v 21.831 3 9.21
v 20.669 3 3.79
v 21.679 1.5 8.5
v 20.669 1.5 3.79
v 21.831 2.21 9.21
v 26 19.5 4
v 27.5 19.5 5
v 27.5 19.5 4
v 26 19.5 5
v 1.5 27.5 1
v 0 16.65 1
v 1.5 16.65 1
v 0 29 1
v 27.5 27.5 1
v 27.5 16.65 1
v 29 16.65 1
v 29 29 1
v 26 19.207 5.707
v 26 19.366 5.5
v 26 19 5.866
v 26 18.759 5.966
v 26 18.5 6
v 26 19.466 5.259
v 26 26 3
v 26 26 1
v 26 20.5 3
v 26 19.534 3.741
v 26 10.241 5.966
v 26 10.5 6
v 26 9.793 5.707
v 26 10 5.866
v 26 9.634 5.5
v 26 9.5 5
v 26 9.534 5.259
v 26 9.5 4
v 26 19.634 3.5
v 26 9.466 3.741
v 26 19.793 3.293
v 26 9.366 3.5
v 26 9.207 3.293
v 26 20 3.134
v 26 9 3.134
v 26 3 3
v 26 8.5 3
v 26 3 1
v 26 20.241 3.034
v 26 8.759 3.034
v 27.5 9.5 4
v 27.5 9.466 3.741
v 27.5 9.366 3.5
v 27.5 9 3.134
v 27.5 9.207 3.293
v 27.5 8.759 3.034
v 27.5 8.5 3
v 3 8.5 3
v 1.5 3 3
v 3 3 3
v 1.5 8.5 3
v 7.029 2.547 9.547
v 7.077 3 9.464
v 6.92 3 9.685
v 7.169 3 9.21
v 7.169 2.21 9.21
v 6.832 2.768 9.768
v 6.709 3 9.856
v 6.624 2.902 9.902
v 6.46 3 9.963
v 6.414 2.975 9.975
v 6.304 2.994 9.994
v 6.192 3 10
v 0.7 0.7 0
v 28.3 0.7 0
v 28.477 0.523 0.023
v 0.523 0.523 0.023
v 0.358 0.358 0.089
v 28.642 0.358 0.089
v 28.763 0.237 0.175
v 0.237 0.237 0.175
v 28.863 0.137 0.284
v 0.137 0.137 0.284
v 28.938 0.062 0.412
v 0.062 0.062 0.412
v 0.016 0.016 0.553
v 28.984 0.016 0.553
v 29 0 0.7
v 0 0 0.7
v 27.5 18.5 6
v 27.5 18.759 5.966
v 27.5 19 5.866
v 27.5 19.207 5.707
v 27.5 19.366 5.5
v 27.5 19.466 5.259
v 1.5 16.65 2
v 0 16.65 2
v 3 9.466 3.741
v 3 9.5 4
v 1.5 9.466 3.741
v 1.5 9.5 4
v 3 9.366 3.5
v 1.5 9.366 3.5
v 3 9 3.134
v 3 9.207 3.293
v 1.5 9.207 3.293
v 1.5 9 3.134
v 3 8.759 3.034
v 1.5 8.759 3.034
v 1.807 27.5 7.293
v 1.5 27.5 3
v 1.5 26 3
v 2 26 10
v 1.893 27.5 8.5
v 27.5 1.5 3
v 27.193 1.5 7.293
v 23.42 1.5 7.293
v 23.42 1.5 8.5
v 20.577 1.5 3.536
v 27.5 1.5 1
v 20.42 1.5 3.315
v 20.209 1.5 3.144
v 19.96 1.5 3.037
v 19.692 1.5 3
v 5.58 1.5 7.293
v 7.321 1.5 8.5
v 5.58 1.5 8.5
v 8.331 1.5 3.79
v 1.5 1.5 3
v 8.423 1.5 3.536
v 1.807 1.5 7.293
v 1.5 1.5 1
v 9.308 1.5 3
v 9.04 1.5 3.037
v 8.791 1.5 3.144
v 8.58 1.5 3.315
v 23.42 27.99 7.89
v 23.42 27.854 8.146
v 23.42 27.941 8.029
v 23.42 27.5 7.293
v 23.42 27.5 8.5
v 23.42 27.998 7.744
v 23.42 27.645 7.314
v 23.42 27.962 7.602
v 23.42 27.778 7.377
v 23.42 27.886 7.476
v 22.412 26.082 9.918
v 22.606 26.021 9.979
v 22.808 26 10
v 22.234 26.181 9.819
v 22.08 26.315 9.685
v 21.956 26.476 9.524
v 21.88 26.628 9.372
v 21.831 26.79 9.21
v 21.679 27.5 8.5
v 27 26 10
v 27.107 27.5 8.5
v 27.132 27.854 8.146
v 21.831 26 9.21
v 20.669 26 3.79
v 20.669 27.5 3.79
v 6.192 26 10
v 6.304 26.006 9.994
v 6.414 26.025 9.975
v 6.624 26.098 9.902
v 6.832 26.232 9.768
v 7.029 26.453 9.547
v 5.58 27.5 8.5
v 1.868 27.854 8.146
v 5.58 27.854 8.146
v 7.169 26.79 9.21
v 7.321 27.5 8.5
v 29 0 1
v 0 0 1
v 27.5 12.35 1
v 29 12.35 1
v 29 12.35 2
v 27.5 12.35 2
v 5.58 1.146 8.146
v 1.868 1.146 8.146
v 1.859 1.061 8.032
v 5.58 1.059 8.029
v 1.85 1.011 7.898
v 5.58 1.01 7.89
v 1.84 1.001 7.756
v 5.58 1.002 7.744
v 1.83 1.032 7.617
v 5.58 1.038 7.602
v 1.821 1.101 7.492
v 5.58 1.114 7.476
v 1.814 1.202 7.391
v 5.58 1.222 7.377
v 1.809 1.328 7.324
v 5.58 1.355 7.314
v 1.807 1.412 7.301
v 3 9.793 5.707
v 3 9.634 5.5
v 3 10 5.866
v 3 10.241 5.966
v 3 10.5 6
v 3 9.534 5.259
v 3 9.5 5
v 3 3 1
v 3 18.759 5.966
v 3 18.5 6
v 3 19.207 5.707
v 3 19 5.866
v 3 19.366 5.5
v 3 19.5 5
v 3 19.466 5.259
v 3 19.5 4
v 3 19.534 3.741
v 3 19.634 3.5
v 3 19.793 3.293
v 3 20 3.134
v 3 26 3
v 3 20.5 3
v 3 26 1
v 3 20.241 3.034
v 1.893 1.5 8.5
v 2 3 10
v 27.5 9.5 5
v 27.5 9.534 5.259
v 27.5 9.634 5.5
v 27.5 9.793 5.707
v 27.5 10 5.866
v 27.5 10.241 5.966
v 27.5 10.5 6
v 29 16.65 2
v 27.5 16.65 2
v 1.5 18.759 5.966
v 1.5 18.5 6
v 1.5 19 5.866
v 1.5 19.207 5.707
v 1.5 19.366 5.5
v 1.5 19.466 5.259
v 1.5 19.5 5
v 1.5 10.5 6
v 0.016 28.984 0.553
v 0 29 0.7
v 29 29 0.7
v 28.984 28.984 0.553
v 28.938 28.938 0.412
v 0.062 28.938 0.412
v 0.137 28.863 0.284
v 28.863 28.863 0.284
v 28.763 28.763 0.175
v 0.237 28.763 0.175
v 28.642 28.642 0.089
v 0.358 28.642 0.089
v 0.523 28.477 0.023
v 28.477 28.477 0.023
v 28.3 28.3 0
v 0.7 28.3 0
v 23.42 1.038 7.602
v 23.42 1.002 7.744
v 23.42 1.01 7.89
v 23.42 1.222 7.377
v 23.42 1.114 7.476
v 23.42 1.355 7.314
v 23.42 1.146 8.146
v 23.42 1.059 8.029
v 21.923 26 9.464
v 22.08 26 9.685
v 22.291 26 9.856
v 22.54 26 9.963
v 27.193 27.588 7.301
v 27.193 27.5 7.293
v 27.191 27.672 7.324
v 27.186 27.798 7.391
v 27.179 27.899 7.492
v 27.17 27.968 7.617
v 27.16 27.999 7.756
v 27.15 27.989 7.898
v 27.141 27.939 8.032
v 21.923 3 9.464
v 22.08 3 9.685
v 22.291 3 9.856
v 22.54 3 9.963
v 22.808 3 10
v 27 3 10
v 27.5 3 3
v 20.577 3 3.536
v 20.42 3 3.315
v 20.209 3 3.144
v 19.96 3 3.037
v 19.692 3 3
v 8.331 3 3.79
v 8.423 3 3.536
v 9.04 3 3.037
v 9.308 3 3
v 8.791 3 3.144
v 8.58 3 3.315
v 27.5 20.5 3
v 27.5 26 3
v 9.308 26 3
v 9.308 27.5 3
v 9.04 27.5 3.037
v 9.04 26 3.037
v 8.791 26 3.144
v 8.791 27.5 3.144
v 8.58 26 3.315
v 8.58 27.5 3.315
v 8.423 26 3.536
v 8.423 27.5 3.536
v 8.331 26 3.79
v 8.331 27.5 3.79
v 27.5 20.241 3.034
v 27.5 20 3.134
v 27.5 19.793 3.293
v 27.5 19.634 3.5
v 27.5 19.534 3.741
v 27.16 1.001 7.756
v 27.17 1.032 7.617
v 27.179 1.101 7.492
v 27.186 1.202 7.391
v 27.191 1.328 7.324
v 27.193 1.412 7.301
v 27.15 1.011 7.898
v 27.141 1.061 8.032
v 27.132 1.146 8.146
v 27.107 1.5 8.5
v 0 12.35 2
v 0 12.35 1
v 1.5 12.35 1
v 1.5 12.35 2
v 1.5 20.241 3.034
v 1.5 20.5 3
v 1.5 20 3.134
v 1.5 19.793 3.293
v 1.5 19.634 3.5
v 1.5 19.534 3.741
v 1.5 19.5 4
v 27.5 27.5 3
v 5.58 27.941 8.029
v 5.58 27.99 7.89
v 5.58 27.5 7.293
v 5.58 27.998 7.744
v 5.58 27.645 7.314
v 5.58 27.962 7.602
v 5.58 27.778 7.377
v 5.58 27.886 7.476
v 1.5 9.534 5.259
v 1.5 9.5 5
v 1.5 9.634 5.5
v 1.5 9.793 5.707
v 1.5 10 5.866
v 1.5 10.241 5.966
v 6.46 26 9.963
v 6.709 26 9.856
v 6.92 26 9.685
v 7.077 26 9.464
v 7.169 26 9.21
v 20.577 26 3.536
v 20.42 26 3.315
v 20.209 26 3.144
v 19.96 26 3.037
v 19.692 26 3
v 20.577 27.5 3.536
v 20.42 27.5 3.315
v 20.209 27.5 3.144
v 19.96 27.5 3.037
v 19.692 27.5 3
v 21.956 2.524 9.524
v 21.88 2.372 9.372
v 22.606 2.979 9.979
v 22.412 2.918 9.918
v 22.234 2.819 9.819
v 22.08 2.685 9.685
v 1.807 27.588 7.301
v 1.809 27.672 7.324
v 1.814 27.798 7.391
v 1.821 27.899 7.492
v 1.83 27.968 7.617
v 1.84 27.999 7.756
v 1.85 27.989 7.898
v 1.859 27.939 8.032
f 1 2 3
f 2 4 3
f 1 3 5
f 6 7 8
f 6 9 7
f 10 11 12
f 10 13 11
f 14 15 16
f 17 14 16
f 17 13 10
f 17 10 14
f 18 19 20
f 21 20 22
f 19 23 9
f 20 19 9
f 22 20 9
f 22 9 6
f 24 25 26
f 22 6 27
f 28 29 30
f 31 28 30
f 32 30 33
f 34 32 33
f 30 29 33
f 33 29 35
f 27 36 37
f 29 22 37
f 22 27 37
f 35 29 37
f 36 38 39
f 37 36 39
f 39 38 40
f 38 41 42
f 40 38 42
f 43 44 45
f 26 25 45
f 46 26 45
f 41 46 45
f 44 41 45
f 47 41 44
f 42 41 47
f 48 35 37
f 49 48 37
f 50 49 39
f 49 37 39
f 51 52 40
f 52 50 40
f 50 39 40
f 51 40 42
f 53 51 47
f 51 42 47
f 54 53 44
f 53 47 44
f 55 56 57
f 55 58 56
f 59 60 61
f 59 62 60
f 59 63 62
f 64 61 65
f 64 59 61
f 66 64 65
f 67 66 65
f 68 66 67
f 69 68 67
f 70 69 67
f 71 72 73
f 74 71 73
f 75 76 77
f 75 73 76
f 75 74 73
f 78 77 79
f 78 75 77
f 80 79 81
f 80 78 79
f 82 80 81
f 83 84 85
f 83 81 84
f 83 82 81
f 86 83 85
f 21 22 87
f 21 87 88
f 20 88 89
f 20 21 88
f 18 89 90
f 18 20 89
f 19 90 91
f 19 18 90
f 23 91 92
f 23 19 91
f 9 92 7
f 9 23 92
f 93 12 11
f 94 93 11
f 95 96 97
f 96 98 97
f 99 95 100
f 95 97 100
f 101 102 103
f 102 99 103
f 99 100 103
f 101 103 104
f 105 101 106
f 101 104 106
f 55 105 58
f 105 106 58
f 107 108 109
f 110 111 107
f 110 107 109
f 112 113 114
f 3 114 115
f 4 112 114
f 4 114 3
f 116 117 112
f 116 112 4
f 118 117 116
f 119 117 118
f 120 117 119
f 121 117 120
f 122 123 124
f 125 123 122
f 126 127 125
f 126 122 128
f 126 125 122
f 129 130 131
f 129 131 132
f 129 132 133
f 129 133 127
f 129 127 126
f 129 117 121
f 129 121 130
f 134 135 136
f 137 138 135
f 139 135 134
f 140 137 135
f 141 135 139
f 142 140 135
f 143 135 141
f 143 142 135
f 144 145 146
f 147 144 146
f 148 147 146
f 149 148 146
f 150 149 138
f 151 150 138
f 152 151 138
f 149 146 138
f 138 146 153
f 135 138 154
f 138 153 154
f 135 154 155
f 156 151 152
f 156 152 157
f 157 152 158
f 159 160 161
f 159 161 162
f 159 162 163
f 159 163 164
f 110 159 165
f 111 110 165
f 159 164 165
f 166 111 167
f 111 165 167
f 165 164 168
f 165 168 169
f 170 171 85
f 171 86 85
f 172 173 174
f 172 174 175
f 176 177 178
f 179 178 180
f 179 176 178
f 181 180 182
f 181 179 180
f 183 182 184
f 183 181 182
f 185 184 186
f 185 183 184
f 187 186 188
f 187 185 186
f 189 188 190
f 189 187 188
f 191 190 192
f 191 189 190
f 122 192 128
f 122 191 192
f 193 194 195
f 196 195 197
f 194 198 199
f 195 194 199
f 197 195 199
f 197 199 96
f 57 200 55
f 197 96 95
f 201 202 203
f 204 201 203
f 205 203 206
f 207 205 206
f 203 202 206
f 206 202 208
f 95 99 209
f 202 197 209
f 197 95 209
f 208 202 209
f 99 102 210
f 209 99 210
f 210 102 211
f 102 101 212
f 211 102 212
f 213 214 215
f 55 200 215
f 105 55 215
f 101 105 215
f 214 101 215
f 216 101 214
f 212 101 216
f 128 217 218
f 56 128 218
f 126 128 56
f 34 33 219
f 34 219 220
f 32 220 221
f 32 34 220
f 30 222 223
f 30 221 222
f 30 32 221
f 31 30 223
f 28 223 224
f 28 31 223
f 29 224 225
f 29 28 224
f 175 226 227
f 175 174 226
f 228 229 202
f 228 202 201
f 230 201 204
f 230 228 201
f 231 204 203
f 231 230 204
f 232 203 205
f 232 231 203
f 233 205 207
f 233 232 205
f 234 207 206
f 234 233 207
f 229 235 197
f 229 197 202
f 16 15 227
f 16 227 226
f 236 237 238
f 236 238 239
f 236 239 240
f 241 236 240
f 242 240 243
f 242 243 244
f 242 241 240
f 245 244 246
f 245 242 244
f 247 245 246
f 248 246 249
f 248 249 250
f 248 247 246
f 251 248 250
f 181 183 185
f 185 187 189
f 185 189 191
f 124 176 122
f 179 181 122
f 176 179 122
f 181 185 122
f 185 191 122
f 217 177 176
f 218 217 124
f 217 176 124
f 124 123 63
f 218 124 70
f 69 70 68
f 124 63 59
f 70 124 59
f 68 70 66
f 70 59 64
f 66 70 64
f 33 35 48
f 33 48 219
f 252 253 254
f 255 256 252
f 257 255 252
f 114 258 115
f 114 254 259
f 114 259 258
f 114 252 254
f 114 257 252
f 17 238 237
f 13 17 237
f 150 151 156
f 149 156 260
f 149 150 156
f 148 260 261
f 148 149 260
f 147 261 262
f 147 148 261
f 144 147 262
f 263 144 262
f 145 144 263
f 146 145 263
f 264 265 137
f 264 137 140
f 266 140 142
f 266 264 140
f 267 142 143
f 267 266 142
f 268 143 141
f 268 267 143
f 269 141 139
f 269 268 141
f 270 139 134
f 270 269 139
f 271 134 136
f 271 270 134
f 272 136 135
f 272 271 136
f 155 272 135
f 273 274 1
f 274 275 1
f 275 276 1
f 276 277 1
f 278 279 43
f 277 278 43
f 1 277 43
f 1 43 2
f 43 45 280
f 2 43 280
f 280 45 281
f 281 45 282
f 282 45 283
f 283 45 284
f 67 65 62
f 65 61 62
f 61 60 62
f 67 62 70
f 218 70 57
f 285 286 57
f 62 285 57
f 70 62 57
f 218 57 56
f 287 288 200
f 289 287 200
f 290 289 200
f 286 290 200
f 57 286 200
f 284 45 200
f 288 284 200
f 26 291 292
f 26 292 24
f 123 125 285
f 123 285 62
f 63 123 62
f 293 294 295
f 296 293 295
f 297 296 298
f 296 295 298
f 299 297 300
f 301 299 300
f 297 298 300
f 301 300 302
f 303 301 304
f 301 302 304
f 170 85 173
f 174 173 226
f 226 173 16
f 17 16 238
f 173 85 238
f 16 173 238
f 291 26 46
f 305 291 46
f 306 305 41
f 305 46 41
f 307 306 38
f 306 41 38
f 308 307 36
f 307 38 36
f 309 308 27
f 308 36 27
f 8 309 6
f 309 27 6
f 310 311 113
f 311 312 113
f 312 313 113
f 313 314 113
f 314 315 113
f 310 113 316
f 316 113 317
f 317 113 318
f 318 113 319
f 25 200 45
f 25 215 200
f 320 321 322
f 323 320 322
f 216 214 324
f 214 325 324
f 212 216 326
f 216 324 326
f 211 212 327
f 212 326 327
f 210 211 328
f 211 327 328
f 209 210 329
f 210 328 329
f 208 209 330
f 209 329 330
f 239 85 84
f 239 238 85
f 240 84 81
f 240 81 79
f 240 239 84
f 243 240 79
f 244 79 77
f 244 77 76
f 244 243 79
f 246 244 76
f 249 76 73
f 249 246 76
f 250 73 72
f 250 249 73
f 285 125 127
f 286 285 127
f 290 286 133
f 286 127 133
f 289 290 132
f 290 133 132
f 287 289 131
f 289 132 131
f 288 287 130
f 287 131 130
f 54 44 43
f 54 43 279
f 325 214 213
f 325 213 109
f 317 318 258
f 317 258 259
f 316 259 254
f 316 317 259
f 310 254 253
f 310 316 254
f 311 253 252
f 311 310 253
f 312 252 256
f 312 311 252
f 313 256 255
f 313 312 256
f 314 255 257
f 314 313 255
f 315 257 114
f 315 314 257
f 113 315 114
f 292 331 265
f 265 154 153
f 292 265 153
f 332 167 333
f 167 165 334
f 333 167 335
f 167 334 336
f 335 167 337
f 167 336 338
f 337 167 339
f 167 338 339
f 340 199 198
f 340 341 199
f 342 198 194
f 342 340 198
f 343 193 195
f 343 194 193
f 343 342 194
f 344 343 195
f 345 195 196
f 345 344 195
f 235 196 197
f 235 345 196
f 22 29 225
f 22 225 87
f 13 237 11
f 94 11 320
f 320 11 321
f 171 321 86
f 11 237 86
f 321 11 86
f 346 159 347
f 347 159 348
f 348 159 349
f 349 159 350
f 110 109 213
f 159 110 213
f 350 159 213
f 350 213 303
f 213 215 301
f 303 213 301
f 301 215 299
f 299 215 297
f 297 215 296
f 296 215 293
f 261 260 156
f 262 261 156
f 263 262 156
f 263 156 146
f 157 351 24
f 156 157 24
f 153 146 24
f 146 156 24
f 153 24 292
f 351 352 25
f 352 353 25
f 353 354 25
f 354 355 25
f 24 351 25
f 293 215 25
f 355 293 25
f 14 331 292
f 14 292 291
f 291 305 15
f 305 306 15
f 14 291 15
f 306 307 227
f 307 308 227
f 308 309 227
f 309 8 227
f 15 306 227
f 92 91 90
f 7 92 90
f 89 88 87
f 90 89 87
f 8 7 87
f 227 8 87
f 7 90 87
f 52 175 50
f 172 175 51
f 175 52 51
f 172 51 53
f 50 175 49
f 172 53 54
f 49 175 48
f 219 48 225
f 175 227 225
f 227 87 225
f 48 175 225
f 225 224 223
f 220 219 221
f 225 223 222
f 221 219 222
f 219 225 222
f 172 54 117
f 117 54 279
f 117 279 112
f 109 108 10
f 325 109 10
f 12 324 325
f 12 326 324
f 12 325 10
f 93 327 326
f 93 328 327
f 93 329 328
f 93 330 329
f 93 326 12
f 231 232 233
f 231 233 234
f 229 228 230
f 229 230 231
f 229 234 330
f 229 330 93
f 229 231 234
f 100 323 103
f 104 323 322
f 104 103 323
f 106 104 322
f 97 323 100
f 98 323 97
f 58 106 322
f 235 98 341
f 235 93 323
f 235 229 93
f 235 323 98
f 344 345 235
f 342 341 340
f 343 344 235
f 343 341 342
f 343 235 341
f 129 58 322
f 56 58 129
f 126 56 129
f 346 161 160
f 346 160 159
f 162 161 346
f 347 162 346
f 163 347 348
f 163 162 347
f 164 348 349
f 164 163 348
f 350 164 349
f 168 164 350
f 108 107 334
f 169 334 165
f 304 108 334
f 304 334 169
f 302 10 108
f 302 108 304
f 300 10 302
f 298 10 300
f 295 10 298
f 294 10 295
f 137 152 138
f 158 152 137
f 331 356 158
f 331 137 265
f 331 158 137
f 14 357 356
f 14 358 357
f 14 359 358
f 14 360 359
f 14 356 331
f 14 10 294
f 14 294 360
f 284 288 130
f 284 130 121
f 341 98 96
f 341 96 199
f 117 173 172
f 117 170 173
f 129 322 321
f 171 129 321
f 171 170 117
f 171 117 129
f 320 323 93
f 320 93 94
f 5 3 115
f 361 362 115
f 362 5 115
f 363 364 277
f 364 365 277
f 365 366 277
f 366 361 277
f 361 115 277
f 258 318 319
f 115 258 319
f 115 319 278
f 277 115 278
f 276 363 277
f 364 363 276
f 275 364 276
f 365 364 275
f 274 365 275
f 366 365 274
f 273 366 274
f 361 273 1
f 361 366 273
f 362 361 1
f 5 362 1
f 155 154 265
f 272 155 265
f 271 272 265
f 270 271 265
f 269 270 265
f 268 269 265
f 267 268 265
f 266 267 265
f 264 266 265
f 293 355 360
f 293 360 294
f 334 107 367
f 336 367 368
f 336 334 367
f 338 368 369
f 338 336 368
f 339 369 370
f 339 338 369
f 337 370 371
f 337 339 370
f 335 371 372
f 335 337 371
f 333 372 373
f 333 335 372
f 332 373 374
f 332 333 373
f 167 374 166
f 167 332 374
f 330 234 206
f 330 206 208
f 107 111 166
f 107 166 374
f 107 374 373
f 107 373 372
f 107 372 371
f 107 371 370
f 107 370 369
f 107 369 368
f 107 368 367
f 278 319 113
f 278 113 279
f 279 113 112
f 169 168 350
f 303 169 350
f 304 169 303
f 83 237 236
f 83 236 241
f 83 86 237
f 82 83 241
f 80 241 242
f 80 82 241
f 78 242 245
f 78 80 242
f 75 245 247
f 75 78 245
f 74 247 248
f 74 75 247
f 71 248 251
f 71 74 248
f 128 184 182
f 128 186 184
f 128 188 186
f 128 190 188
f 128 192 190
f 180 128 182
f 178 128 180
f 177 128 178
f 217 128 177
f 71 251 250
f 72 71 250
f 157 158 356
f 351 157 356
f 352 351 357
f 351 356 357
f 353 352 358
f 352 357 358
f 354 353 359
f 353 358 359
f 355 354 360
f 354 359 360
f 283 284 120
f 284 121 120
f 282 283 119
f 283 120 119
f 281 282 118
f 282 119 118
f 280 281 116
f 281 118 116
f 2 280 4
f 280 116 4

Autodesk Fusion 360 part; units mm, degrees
sketch "Skizze1" plane through (0, 0, 0) normal (0, 0, 1) x (1, 0, 0)
  line L0 (0, 0) -> (29, 0)
  line L1 (29, 0) -> (29, 29)
  line L2 (29, 29) -> (0, 29)
  line L3 (0, 29) -> (0, 0)
  dimension "d1" = 29
  dimension "d2" = 29
extrude "Extrusion1" add sketch "Skizze1" along normal blind 1
fillet "Abrundung1" radius 0.7 4 edges at (14.5, 0, 0) (29, 14.5, 0) (14.5, 29, 0) (0, 14.5, 0)
sketch "Skizze2" plane through (0, 0, 1) normal (0, 0, 1) x (-1, 0, 0)
  line L0 (0, -29) -> (0, 0)
  line L1 (0, 0) -> (-29, 0)
  line L2 (-29, 0) -> (-29, -29)
  line L3 (-29, -29) -> (0, -29)
  line L4 (-1.5, -27.5) -> (-27.5, -27.5)
  line L5 (-27.5, -27.5) -> (-27.5, -1.5)
  line L6 (-27.5, -1.5) -> (-1.5, -1.5)
  line L7 (-1.5, -1.5) -> (-1.5, -27.5)
  line L8 (-26, -26) -> (-26, -3)
  line L9 (-26, -3) -> (-3, -3)
  line L10 (-3, -3) -> (-3, -26)
  line L11 (-3, -26) -> (-26, -26)
  dimension "d7" = 26
  dimension "d8" = 26
  dimension "d9" = 29
  dimension "d10" = 1.5
  dimension "d11" = 1.5
  dimension "d12" = 1.5
extrude "Extrusion2" add sketch "Skizze2" along normal blind 2 contours L4 L5 L6 L7
sketch "Skizze3" plane through (1.5, 0, 0) normal (-1, 0, 0) x (0, -1, 0)
  line L0 (-27.5, 1) -> (-1.5, 1)
  line L1 (-1.5, 1) -> (-1.5, 3)
  line L2 (-1.5, 3) -> (-27.5, 3)
  line L3 (-27.5, 3) -> (-27.5, 1)
  line L4 (-9.5, 4) -> (-9.5, 5)
  line L5 (-10.5, 6) -> (-18.5, 6)
  line L6 (-19.5, 5) -> (-19.5, 4)
  line L7 (-8.5, 3) -> (-1.5, 3)
  line L8 (-27.5, 3) -> (-20.5, 3)
  arc A0 (-20.5, 3) -> (-19.5, 4) centre (-20.5, 4) ccw
  line L9 (-9.5, 3) -> (-1.5, 3)
  arc A1 (-9.5, 4) -> (-8.5, 3) centre (-8.5, 4) ccw
  arc A2 (-18.5, 6) -> (-19.5, 5) centre (-18.5, 5) ccw
  arc A3 (-9.5, 5) -> (-10.5, 6) centre (-10.5, 5) ccw
  point P0 (-19.5, 3)
  point P1 (-19.5, 6)
  dimension "d15" = 10
  dimension "d16" = 3
  dimension "d17" = 26
  dimension "d18" = 8
  dimension "d19" = 1
  dimension "d20" = 1
  dimension "d21" = 1
  dimension "d22" = 1
extrude "Extrusion3" add sketch "Skizze3" against normal up to surface (26 mm away) contours L2 L4 L5 L6 A0 L9 A1 A2 A3
extrude "Extrusion4" cut 1 faces at (10.6667, 18.3333, 1) along direction (0, 0, 1) blind 5
sketch "Skizze4" plane through (0, 27.5, 0) normal (0, 1, 0) x (-1, 0, 0)
  line L0 (-27.5, 1) -> (-1.5, 1)
  line L1 (-1.5, 1) -> (-1.5, 3)
  line L2 (-1.5, 3) -> (-27.5, 3)
  line L3 (-27.5, 3) -> (-27.5, 1)
sketch "Skizze5" plane through (0, 0, 1) normal (0, 0, 1) x (-1, 0, 0)
  line L0 (0, -29) -> (0, 0)
  line L1 (0, 0) -> (-29, 0)
  line L2 (-29, 0) -> (-29, -29)
  line L3 (-29, -29) -> (0, -29)
  line L4 (-1.5, -1.5) -> (-1.5, -27.5)
  line L5 (-1.5, -27.5) -> (-27.5, -27.5)
  line L6 (-27.5, -27.5) -> (-27.5, -1.5)
  line L7 (-27.5, -1.5) -> (-1.5, -1.5)
  line L8 (-27.5, -16.65) -> (-29, -16.65)
  line L9 (-29, -16.65) -> (-29, -12.35)
  line L10 (-29, -12.35) -> (-27.5, -12.35)
  line L11 (-27.5, -12.35) -> (-27.5, -16.65)
  line L12 (-27.5, -12.35) -> (0, -12.35) construction
  line L13 (0, -12.35) -> (-1.5, -12.35)
  line L14 (-1.5, -12.35) -> (-1.5, -16.65)
  line L15 (-1.5, -16.65) -> (0, -16.65)
  line L16 (0, -16.65) -> (0, -12.35)
  dimension "d27" = 4.3
  dimension "d28" = 29
  dimension "d29" = 12.35
  dimension "d30" = 4.3
extrude "Extrusion5" add sketch "Skizze5" along normal blind 1 contours L0 L4 L13 L14 L15 L16 | L2 L6 L8 L9 L10 L11
sketch "Skizze6" plane through (0, 27.5, 0) normal (0, 1, 0) x (-1, 0, 0)
  line L0 (-27.5, 1) -> (-1.5, 1)
  line L1 (-1.5, 1) -> (-1.5, 3)
  line L2 (-1.5, 3) -> (-27.5, 3)
  line L3 (-27.5, 3) -> (-27.5, 1)
  line L4 (-29.2103, 10) -> (4.3331, 10) construction
  line L5 (-1.5, 3) -> (-27.5, 3)
  line L6 (-1.5, 3) -> (-1.5, 10) construction
  line L7 (-1.5, 3) -> (-2, 10)
  line L8 (-14.5, 3) -> (-14.5, 12.4711) construction
  line L9 (-2, 10) -> (-6.1916, 10)
  line L10 (-7.1694, 9.2095) -> (-8.3306, 3.7905)
  line L11 (-1.5, 3) -> (-14.5, 3)
  arc A0 (-9.3084, 3) -> (-8.3306, 3.7905) centre (-9.3084, 4) ccw
  arc A1 (-6.1916, 10) -> (-7.1694, 9.2095) centre (-6.1916, 9) ccw
  line L12 (-21.8306, 9.2095) -> (-20.6694, 3.7905)
  arc A2 (-21.8306, 9.2095) -> (-22.8084, 10) centre (-22.8084, 9) ccw
  line L13 (-27, 10) -> (-22.8084, 10)
  line L14 (-27.5, 3) -> (-27, 10)
  arc A3 (-20.6694, 3.7905) -> (-19.6916, 3) centre (-19.6916, 4) ccw
  line L15 (-27.5, 3) -> (-14.5, 3)
  point P0 (-7, 10)
  dimension "d33" = 7
  dimension "d34" = 0.5
  dimension "d36" = 5
  dimension "d37" = 1
  dimension "d38" = 1
extrude "Extrusion6" add sketch "Skizze6" against normal up to surface (1.5 mm away) contours L2 L5 L12 A2 L13 L14 A3 L15 | L2 L5 L7 L9 L10 L11 A0 A1
sketch "Skizze7" plane through (27.5, 0, 0) normal (1, 0, 0) x (0, 1, 0)
  line L0 (16.65, 2) -> (16.65, 1)
  line L1 (16.65, 1) -> (27.5, 1)
  line L2 (27.5, 1) -> (27.5, 3)
  line L3 (27.5, 3) -> (26, 3)
  line L4 (26, 3) -> (20.5, 3)
  arc A0 (19.5, 4) -> (20.5, 3) centre (20.5, 4) ccw
  line L5 (19.5, 4) -> (19.5, 5)
  arc A1 (19.5, 5) -> (18.5, 6) centre (18.5, 5) ccw
  line L6 (18.5, 6) -> (10.5, 6)
  arc A2 (10.5, 6) -> (9.5, 5) centre (10.5, 5) ccw
  line L7 (9.5, 5) -> (9.5, 4)
  arc A3 (8.5, 3) -> (9.5, 4) centre (8.5, 4) ccw
  line L8 (8.5, 3) -> (1.5, 3)
  line L9 (1.5, 3) -> (1.5, 1)
  line L10 (1.5, 1) -> (12.35, 1)
  line L11 (12.35, 1) -> (12.35, 2)
  line L12 (12.35, 2) -> (16.65, 2)
  line L13 (26, 10) -> (26, 3)
  line L14 (26, 3) -> (27.5, 3)
  line L15 (27.5, 3) -> (27.5, 10)
  line L16 (27.5, 10) -> (26, 10)
  line L17 (26, 10) -> (27.6131, 8.3869)
  line L18 (26, 10) -> (28.2813, 10) construction
  dimension "d41" = 45
extrude "Extrusion7" cut sketch "Skizze7" against normal blind 29 contours L15 L16 L17
sketch "Skizze9" plane through (27.5, 0, 0) normal (1, 0, 0) x (0, 1, 0)
  line L0 (16.65, 2) -> (16.65, 1)
  line L1 (16.65, 1) -> (27.5, 1)
  line L2 (27.5, 1) -> (27.5, 3)
  line L3 (27.5, 3) -> (26, 3)
  line L4 (26, 3) -> (20.5, 3)
  arc A0 (19.5, 4) -> (20.5, 3) centre (20.5, 4) ccw
  line L5 (19.5, 4) -> (19.5, 5)
  arc A1 (19.5, 5) -> (18.5, 6) centre (18.5, 5) ccw
  line L6 (18.5, 6) -> (10.5, 6)
  arc A2 (10.5, 6) -> (9.5, 5) centre (10.5, 5) ccw
  line L7 (9.5, 5) -> (9.5, 4)
  arc A3 (8.5, 3) -> (9.5, 4) centre (8.5, 4) ccw
  line L8 (8.5, 3) -> (1.5, 3)
  line L9 (1.5, 3) -> (1.5, 1)
  line L10 (1.5, 1) -> (12.35, 1)
  line L11 (12.35, 1) -> (12.35, 2)
  line L12 (12.35, 2) -> (16.65, 2)
  line L13 (27.5, 8.5) -> (26, 10)
  line L14 (26, 10) -> (26, 3)
  line L15 (26, 3) -> (27.5, 3)
  line L16 (27.5, 3) -> (27.5, 8.5)
  line L17 (27.5, 8.5) -> (27.8536, 8.1464)
  arc A4 (27.5, 7.2929) -> (27.8536, 8.1464) centre (27.5, 7.7929) ccw
  dimension "d44" = 1
extrude "Extrusion8" add sketch "Skizze9" against normal up to surface (26 mm away) contours L16 L17 A4
sketch "Skizze10" plane through (0, 27.5, 0) normal (0, 1, 0) x (-1, 0, 0)
  line L0 (-21.4199, 7.2929) -> (-27.1934, 7.2929)
  line L1 (-27.1934, 7.2929) -> (-27.5, 3)
  line L2 (-27.5, 3) -> (-27.5, 1)
  line L3 (-27.5, 1) -> (-1.5, 1)
  line L4 (-1.5, 1) -> (-1.5, 3)
  line L5 (-1.5, 3) -> (-1.8066, 7.2929)
  line L6 (-1.8066, 7.2929) -> (-7.5801, 7.2929)
  line L7 (-7.5801, 7.2929) -> (-8.3306, 3.7905)
  arc A0 (-9.3084, 3) -> (-8.3306, 3.7905) centre (-9.3084, 4) ccw
  line L8 (-9.3084, 3) -> (-19.6916, 3)
  arc A1 (-20.6694, 3.7905) -> (-19.6916, 3) centre (-19.6916, 4) ccw
  line L9 (-20.6694, 3.7905) -> (-21.4199, 7.2929)
  line L10 (-7.3214, 8.5) -> (-7.1694, 9.2095)
  line L11 (-21.8306, 9.2095) -> (-21.6786, 8.5)
  line L12 (-27.1071, 8.5) -> (-27, 10)
  line L13 (-2, 10) -> (-1.8929, 8.5)
  line L14 (-1.8929, 8.5) -> (-1.8066, 7.2929)
  line L15 (-7.3214, 8.5) -> (-7.5801, 7.2929)
  line L16 (-27.1071, 8.5) -> (-27.1934, 7.2929)
  line L17 (-21.6786, 8.5) -> (-21.4199, 7.2929)
  line L18 (-1.5, 8.1464) -> (-1.5, 7.2929)
  line L19 (-1.5, 8.1464) -> (-27.5, 8.1464)
  line L20 (-27.5, 8.1464) -> (-27.5, 7.2929)
  line L21 (-27.5, 7.2929) -> (-27.1934, 7.2929)
  line L22 (-27.1934, 7.2929) -> (-21.4199, 7.2929)
  line L23 (-21.4199, 7.2929) -> (-7.5801, 7.2929)
  line L24 (-7.5801, 7.2929) -> (-1.8066, 7.2929)
  line L25 (-1.8066, 7.2929) -> (-1.5, 7.2929)
  line L26 (-27, 10) -> (-27.1071, 8.5)
  line L27 (-27.1071, 8.5) -> (-27.5, 8.5)
  line L28 (-27.5, 8.5) -> (-27.5, 8.1464)
  line L29 (-27.5, 8.1464) -> (-1.5, 8.1464)
  line L30 (-1.5, 8.1464) -> (-1.5, 8.5)
  line L31 (-1.5, 8.5) -> (-1.8929, 8.5)
  line L32 (-1.8929, 8.5) -> (-2, 10)
  line L33 (-2, 10) -> (-6.1916, 10)
  arc A2 (-6.1916, 10) -> (-7.1694, 9.2095) centre (-6.1916, 9) ccw
  line L34 (-7.1694, 9.2095) -> (-7.3214, 8.5)
  line L35 (-7.3214, 8.5) -> (-21.6786, 8.5)
  line L36 (-21.6786, 8.5) -> (-21.8306, 9.2095)
  arc A3 (-21.8306, 9.2095) -> (-22.8084, 10) centre (-22.8084, 9) ccw
  line L37 (-22.8084, 10) -> (-27, 10)
  line L38 (-27.5, 8.5) -> (-1.5, 8.5)
  line L39 (-1.5, 8.5) -> (-1.5, 7.2929)
  line L40 (-1.5, 7.2929) -> (-27.5, 7.2929)
  line L41 (-27.5, 7.2929) -> (-27.5, 8.5)
extrude "Extrusion9" cut sketch "Skizze10" along normal blind 1.5 contours L15 L17 L19 L23 L29 L40 | L16 L19 L20 L21 L29 L40 L41 | L15 L17 L19 L29 L35 L38 | L16 L19 L27 L28 L29 L38 L41 | L14 L18 L19 L25 L29 L39 L40 | L14 L19 L29 L30 L31 L38 L39
sketch "Skizze11" plane through (0, 0, 1) normal (0, 0, 1) x (-1, 0, 0)
  line L0 (-27.5, -16.65) -> (-29, -16.65)
  line L1 (-29, -16.65) -> (-29, -29)
  line L2 (-29, -29) -> (0, -29)
  line L3 (0, -29) -> (0, -16.65)
  line L4 (0, -16.65) -> (-1.5, -16.65)
  line L5 (-1.5, -16.65) -> (-1.5, -27.5)
  line L6 (-1.5, -27.5) -> (-27.5, -27.5)
  line L7 (-27.5, -27.5) -> (-27.5, -16.65)
  ellipse E0 centre (-7.473, -27.5) end of major axis (-7.473, -27) minor radius 0.1071 (-7.5801, -27.5) -> (-7.3972, -27.8536) ccw
  ellipse E1 centre (-21.527, -27.5) end of major axis (-21.527, -28) minor radius 0.1071 (-21.6028, -27.8536) -> (-21.4199, -27.5) ccw
  ellipse E2 centre (-27.1577, -27.5) end of major axis (-27.1577, -27) minor radius 0.0357 (-27.1934, -27.5) -> (-27.1324, -27.8536) ccw
  ellipse E3 centre (-1.8423, -27.5) end of major axis (-1.8423, -28) minor radius 0.0357 (-1.8676, -27.8536) -> (-1.8066, -27.5) ccw
  line L8 (-7.5801, -27.5) -> (-5.5801, -27.5)
  line L9 (-5.5801, -27.5) -> (-5.5801, -29)
  line L10 (-5.5801, -29) -> (-7.5801, -29)
  line L11 (-7.5801, -29) -> (-7.5801, -27.5)
  line L12 (-21.4199, -27.5) -> (-23.4199, -27.5)
  line L13 (-23.4199, -27.5) -> (-23.4199, -29)
  line L14 (-23.4199, -29) -> (-21.4199, -29)
  line L15 (-21.4199, -29) -> (-21.4199, -27.5)
  dimension "d49" = 2
  dimension "d50" = 2
extrude "Extrusion10" cut sketch "Skizze11" along normal blind 12 contours L2 L6 L12 L13 L14 L15 | L2 L6 L8 L9 L10 L11
sketch "Skizze12" plane through (0, 0, 1) normal (0, 0, 1) x (-1, 0, 0)
  line L0 (-3, -3) -> (-26, -3)
  line L1 (-26, -3) -> (-26, -26)
  line L2 (-26, -26) -> (-3, -26)
  line L3 (-3, -26) -> (-3, -3)
  line L4 (-26, -14.5) -> (1.3472, -14.5)
  line L5 (-26, -14.5) -> (-29.3311, -14.5)
  line L6 (-29, -12.35) -> (-27.5, -12.35)
  line L7 (-27.5, -12.35) -> (-27.5, -1.5)
  line L8 (-27.5, -1.5) -> (-1.5, -1.5)
  line L9 (-1.5, -1.5) -> (-1.5, -12.35)
  line L10 (-1.5, -12.35) -> (0, -12.35)
  line L11 (0, -12.35) -> (0, 0)
  line L12 (0, 0) -> (-29, 0)
  line L13 (-29, 0) -> (-29, -12.35)
  line L14 (-29, -12.35) -> (-29, -16.65)
  line L15 (0, -16.65) -> (0, -12.35)
  line L16 (0, -14.5) -> (-29, -14.5)
  line L17 (-29, -14.5) -> (-29, 0)
  line L18 (-29, 0) -> (0, 0)
  line L19 (0, 0) -> (0, -14.5)
extrude "Extrusion11" cut sketch "Skizze12" along normal blind 8 and the other way blind 3 contours L0 L1 L3 L4 L16 | L0 L1 L3 L4 L5 L6 L7 L8 L9 L10 L14 L15 L16 L17 L19 | L6 L7 L8 L9 L10 L11 L12 L13 L17 L18 L19
mirror "Spiegeln1" about plane through (26, 14.5, 1) normal (0, -1, 0) of bodies 1 merged
equation "d10 = ( d9 - d7 ) / 2"
equation "d11 = d10"
equation "d18 = ( d17 - d15 ) / 2"
equation "d29 = ( d28 - d27 ) / 2"
equation "d30 = d27"
